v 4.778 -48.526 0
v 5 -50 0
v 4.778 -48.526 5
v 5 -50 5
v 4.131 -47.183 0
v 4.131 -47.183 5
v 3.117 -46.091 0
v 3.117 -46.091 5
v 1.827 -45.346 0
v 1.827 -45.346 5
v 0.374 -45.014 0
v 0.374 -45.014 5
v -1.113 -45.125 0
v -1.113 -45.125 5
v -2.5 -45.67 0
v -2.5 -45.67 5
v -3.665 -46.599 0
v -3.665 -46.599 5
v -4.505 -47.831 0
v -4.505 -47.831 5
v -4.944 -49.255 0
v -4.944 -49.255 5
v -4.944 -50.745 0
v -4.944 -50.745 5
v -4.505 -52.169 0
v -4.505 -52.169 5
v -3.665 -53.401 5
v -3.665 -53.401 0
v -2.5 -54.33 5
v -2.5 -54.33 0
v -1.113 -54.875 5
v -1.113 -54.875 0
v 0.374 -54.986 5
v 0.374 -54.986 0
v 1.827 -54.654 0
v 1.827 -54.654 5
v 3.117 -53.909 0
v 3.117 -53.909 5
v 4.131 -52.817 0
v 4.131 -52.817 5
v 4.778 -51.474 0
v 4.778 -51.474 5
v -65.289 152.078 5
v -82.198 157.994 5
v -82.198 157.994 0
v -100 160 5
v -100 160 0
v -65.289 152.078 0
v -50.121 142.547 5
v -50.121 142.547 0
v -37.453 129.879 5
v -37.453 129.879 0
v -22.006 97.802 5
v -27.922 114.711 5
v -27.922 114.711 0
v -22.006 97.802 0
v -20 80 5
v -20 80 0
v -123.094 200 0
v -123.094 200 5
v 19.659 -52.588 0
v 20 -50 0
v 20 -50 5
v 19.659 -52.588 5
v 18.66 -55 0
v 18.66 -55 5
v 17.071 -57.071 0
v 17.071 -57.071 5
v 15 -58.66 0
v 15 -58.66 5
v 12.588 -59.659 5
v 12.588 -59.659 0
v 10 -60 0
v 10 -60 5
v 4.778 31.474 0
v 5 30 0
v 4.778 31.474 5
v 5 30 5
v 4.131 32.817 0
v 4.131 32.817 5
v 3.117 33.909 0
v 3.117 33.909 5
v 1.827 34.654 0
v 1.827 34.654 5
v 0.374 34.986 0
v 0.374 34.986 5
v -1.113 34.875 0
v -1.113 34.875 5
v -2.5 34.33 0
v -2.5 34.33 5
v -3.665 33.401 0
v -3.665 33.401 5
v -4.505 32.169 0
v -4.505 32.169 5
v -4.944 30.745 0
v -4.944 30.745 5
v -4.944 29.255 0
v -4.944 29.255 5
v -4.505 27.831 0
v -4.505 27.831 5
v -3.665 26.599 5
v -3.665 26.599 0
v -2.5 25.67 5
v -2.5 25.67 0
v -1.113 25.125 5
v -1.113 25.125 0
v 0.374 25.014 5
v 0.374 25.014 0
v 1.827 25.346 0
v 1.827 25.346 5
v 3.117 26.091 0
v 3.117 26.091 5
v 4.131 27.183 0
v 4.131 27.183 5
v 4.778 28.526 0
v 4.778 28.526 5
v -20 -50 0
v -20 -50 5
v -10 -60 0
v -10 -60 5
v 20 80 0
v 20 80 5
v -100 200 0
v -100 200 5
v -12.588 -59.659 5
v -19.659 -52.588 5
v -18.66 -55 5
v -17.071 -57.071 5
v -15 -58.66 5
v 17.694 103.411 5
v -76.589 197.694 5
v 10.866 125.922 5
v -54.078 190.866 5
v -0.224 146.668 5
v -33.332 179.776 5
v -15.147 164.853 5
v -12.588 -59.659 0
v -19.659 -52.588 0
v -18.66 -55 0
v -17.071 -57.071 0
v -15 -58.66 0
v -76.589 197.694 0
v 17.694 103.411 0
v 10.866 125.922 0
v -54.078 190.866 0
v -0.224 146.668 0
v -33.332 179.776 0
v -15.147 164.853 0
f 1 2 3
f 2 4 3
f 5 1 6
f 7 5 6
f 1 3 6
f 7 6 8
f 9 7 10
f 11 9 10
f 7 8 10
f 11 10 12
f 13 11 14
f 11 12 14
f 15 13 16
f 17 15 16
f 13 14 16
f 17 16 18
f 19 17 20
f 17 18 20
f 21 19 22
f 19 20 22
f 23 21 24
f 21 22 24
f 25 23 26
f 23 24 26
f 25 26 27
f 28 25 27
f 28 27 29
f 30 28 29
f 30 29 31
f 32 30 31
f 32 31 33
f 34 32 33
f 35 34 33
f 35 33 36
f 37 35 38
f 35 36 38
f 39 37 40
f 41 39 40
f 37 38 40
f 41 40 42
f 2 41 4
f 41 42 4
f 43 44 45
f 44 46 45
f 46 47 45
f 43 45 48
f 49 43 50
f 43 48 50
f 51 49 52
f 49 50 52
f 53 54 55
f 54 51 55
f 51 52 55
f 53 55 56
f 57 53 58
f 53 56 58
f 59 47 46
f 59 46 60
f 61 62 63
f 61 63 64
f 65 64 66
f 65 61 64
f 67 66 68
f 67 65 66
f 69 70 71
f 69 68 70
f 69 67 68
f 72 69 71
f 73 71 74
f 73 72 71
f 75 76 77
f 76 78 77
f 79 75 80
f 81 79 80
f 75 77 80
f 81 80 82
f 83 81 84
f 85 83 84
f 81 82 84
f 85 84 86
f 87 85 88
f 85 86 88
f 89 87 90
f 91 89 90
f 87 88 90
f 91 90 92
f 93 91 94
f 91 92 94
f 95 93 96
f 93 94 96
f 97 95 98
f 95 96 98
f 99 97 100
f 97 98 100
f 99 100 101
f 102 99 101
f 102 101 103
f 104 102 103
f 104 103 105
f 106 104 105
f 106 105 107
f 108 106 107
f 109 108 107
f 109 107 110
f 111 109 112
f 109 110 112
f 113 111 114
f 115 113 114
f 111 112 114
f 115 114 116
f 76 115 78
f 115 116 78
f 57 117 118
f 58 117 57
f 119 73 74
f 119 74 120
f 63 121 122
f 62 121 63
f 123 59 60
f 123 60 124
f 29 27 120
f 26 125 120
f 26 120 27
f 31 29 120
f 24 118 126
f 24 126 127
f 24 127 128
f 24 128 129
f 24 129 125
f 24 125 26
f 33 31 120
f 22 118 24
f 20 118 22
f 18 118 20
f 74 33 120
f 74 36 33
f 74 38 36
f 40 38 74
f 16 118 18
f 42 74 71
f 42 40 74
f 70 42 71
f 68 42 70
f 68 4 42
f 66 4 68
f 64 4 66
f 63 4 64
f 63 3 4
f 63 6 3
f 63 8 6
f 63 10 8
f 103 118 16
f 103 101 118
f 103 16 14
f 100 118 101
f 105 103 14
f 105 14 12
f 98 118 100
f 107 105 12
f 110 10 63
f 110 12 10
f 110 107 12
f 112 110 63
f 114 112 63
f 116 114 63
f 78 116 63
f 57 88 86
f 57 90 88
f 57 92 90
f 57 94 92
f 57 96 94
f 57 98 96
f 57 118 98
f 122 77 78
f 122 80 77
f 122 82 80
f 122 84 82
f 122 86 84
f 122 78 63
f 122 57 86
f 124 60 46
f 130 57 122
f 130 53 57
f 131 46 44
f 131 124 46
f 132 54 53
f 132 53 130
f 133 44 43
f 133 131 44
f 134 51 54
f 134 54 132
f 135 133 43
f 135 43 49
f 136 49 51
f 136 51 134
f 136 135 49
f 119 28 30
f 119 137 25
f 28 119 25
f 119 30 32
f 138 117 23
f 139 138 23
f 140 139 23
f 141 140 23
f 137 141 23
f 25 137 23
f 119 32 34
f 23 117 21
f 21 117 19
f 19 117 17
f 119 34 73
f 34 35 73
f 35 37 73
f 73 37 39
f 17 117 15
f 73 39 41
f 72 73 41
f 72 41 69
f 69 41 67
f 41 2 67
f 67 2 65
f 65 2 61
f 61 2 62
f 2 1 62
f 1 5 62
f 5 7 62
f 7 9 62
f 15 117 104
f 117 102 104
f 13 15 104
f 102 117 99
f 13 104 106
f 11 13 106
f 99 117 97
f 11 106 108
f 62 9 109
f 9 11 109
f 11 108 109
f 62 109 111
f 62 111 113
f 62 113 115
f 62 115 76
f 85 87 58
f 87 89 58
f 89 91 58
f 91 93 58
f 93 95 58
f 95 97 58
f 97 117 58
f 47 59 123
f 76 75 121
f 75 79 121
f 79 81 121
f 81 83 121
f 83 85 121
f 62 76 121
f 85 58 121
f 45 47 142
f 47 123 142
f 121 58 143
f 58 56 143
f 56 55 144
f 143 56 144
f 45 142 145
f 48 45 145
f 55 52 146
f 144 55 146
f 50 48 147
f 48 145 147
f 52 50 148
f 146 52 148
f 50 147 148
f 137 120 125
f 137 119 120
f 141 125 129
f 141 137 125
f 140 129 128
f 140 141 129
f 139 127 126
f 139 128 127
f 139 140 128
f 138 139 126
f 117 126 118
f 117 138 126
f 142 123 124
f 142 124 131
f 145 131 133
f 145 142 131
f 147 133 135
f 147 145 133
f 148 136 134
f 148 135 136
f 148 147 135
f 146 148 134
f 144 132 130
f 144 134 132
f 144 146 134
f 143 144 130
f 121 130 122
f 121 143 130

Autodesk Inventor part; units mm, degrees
ref_plane "YZ Plane" through (0, 0, 0) normal (1, 0, 0) x (0, 1, 0)
ref_plane "XZ Plane" through (0, 0, 0) normal (0, 1, 0) x (-1, 0, 0)
ref_plane "XY Plane" through (0, 0, 0) normal (0, 0, 1) x (1, 0, 0)
sketch "Sketch1" plane through (0, 0, 0) normal (0, 0, 1) x (1, 0, 0)
  line L0 (20, 50) -> (20, -50)
  line L1 (10, -60) -> (-10, -60)
  line L2 (-20, -50) -> (-20, 50)
  arc A0 (10, -60) -> (20, -50) centre (10, -50) ccw
  arc A1 (-20, -50) -> (-10, -60) centre (-10, -50) ccw
  line L3 (-20, 80) -> (-20, 50)
  line L4 (20, 80) -> (20, 50)
  line L5 (-20, 80) -> (-100, 80) construction
  arc A2 (-20, 80) -> (-100, 160) centre (-100, 80) ccw
  arc A3 (20, 80) -> (-100, 200) centre (-100, 80) ccw
  line L6 (-100, 160) -> (-123.094, 200)
  line L7 (-100, 160) -> (-53.812, 160) construction
  line L8 (-123.094, 200) -> (-100, 200)
  point P0 (0, 0)
  point P1 (20, 0)
  point P2 (0, 80)
  dimension "d1" = 40
  dimension "d11" = 80
  dimension "d12" = 140
  dimension "d19" = 120
extrude "Extrusion1" add sketch "Sketch1" along normal blind 5
sketch "Sketch3" plane through (0, 0, 5) normal (0, 0, 1) x (1, 0, 0)
  circle A0 centre (0, -50) radius 5
  line L0 (-10, -60) -> (10, -60) projected
  circle A1 centre (0, 30) radius 5
  point P0 (0, 0)
  dimension "d13" = 10
  dimension "d14" = 10
  dimension "d15" = 10
  dimension "d16" = 80
extrude "Extrusion3" cut sketch "Sketch3" against normal up to surface (5 mm away)
equation "\"d17\" = d13"
properties part number "garrita"
